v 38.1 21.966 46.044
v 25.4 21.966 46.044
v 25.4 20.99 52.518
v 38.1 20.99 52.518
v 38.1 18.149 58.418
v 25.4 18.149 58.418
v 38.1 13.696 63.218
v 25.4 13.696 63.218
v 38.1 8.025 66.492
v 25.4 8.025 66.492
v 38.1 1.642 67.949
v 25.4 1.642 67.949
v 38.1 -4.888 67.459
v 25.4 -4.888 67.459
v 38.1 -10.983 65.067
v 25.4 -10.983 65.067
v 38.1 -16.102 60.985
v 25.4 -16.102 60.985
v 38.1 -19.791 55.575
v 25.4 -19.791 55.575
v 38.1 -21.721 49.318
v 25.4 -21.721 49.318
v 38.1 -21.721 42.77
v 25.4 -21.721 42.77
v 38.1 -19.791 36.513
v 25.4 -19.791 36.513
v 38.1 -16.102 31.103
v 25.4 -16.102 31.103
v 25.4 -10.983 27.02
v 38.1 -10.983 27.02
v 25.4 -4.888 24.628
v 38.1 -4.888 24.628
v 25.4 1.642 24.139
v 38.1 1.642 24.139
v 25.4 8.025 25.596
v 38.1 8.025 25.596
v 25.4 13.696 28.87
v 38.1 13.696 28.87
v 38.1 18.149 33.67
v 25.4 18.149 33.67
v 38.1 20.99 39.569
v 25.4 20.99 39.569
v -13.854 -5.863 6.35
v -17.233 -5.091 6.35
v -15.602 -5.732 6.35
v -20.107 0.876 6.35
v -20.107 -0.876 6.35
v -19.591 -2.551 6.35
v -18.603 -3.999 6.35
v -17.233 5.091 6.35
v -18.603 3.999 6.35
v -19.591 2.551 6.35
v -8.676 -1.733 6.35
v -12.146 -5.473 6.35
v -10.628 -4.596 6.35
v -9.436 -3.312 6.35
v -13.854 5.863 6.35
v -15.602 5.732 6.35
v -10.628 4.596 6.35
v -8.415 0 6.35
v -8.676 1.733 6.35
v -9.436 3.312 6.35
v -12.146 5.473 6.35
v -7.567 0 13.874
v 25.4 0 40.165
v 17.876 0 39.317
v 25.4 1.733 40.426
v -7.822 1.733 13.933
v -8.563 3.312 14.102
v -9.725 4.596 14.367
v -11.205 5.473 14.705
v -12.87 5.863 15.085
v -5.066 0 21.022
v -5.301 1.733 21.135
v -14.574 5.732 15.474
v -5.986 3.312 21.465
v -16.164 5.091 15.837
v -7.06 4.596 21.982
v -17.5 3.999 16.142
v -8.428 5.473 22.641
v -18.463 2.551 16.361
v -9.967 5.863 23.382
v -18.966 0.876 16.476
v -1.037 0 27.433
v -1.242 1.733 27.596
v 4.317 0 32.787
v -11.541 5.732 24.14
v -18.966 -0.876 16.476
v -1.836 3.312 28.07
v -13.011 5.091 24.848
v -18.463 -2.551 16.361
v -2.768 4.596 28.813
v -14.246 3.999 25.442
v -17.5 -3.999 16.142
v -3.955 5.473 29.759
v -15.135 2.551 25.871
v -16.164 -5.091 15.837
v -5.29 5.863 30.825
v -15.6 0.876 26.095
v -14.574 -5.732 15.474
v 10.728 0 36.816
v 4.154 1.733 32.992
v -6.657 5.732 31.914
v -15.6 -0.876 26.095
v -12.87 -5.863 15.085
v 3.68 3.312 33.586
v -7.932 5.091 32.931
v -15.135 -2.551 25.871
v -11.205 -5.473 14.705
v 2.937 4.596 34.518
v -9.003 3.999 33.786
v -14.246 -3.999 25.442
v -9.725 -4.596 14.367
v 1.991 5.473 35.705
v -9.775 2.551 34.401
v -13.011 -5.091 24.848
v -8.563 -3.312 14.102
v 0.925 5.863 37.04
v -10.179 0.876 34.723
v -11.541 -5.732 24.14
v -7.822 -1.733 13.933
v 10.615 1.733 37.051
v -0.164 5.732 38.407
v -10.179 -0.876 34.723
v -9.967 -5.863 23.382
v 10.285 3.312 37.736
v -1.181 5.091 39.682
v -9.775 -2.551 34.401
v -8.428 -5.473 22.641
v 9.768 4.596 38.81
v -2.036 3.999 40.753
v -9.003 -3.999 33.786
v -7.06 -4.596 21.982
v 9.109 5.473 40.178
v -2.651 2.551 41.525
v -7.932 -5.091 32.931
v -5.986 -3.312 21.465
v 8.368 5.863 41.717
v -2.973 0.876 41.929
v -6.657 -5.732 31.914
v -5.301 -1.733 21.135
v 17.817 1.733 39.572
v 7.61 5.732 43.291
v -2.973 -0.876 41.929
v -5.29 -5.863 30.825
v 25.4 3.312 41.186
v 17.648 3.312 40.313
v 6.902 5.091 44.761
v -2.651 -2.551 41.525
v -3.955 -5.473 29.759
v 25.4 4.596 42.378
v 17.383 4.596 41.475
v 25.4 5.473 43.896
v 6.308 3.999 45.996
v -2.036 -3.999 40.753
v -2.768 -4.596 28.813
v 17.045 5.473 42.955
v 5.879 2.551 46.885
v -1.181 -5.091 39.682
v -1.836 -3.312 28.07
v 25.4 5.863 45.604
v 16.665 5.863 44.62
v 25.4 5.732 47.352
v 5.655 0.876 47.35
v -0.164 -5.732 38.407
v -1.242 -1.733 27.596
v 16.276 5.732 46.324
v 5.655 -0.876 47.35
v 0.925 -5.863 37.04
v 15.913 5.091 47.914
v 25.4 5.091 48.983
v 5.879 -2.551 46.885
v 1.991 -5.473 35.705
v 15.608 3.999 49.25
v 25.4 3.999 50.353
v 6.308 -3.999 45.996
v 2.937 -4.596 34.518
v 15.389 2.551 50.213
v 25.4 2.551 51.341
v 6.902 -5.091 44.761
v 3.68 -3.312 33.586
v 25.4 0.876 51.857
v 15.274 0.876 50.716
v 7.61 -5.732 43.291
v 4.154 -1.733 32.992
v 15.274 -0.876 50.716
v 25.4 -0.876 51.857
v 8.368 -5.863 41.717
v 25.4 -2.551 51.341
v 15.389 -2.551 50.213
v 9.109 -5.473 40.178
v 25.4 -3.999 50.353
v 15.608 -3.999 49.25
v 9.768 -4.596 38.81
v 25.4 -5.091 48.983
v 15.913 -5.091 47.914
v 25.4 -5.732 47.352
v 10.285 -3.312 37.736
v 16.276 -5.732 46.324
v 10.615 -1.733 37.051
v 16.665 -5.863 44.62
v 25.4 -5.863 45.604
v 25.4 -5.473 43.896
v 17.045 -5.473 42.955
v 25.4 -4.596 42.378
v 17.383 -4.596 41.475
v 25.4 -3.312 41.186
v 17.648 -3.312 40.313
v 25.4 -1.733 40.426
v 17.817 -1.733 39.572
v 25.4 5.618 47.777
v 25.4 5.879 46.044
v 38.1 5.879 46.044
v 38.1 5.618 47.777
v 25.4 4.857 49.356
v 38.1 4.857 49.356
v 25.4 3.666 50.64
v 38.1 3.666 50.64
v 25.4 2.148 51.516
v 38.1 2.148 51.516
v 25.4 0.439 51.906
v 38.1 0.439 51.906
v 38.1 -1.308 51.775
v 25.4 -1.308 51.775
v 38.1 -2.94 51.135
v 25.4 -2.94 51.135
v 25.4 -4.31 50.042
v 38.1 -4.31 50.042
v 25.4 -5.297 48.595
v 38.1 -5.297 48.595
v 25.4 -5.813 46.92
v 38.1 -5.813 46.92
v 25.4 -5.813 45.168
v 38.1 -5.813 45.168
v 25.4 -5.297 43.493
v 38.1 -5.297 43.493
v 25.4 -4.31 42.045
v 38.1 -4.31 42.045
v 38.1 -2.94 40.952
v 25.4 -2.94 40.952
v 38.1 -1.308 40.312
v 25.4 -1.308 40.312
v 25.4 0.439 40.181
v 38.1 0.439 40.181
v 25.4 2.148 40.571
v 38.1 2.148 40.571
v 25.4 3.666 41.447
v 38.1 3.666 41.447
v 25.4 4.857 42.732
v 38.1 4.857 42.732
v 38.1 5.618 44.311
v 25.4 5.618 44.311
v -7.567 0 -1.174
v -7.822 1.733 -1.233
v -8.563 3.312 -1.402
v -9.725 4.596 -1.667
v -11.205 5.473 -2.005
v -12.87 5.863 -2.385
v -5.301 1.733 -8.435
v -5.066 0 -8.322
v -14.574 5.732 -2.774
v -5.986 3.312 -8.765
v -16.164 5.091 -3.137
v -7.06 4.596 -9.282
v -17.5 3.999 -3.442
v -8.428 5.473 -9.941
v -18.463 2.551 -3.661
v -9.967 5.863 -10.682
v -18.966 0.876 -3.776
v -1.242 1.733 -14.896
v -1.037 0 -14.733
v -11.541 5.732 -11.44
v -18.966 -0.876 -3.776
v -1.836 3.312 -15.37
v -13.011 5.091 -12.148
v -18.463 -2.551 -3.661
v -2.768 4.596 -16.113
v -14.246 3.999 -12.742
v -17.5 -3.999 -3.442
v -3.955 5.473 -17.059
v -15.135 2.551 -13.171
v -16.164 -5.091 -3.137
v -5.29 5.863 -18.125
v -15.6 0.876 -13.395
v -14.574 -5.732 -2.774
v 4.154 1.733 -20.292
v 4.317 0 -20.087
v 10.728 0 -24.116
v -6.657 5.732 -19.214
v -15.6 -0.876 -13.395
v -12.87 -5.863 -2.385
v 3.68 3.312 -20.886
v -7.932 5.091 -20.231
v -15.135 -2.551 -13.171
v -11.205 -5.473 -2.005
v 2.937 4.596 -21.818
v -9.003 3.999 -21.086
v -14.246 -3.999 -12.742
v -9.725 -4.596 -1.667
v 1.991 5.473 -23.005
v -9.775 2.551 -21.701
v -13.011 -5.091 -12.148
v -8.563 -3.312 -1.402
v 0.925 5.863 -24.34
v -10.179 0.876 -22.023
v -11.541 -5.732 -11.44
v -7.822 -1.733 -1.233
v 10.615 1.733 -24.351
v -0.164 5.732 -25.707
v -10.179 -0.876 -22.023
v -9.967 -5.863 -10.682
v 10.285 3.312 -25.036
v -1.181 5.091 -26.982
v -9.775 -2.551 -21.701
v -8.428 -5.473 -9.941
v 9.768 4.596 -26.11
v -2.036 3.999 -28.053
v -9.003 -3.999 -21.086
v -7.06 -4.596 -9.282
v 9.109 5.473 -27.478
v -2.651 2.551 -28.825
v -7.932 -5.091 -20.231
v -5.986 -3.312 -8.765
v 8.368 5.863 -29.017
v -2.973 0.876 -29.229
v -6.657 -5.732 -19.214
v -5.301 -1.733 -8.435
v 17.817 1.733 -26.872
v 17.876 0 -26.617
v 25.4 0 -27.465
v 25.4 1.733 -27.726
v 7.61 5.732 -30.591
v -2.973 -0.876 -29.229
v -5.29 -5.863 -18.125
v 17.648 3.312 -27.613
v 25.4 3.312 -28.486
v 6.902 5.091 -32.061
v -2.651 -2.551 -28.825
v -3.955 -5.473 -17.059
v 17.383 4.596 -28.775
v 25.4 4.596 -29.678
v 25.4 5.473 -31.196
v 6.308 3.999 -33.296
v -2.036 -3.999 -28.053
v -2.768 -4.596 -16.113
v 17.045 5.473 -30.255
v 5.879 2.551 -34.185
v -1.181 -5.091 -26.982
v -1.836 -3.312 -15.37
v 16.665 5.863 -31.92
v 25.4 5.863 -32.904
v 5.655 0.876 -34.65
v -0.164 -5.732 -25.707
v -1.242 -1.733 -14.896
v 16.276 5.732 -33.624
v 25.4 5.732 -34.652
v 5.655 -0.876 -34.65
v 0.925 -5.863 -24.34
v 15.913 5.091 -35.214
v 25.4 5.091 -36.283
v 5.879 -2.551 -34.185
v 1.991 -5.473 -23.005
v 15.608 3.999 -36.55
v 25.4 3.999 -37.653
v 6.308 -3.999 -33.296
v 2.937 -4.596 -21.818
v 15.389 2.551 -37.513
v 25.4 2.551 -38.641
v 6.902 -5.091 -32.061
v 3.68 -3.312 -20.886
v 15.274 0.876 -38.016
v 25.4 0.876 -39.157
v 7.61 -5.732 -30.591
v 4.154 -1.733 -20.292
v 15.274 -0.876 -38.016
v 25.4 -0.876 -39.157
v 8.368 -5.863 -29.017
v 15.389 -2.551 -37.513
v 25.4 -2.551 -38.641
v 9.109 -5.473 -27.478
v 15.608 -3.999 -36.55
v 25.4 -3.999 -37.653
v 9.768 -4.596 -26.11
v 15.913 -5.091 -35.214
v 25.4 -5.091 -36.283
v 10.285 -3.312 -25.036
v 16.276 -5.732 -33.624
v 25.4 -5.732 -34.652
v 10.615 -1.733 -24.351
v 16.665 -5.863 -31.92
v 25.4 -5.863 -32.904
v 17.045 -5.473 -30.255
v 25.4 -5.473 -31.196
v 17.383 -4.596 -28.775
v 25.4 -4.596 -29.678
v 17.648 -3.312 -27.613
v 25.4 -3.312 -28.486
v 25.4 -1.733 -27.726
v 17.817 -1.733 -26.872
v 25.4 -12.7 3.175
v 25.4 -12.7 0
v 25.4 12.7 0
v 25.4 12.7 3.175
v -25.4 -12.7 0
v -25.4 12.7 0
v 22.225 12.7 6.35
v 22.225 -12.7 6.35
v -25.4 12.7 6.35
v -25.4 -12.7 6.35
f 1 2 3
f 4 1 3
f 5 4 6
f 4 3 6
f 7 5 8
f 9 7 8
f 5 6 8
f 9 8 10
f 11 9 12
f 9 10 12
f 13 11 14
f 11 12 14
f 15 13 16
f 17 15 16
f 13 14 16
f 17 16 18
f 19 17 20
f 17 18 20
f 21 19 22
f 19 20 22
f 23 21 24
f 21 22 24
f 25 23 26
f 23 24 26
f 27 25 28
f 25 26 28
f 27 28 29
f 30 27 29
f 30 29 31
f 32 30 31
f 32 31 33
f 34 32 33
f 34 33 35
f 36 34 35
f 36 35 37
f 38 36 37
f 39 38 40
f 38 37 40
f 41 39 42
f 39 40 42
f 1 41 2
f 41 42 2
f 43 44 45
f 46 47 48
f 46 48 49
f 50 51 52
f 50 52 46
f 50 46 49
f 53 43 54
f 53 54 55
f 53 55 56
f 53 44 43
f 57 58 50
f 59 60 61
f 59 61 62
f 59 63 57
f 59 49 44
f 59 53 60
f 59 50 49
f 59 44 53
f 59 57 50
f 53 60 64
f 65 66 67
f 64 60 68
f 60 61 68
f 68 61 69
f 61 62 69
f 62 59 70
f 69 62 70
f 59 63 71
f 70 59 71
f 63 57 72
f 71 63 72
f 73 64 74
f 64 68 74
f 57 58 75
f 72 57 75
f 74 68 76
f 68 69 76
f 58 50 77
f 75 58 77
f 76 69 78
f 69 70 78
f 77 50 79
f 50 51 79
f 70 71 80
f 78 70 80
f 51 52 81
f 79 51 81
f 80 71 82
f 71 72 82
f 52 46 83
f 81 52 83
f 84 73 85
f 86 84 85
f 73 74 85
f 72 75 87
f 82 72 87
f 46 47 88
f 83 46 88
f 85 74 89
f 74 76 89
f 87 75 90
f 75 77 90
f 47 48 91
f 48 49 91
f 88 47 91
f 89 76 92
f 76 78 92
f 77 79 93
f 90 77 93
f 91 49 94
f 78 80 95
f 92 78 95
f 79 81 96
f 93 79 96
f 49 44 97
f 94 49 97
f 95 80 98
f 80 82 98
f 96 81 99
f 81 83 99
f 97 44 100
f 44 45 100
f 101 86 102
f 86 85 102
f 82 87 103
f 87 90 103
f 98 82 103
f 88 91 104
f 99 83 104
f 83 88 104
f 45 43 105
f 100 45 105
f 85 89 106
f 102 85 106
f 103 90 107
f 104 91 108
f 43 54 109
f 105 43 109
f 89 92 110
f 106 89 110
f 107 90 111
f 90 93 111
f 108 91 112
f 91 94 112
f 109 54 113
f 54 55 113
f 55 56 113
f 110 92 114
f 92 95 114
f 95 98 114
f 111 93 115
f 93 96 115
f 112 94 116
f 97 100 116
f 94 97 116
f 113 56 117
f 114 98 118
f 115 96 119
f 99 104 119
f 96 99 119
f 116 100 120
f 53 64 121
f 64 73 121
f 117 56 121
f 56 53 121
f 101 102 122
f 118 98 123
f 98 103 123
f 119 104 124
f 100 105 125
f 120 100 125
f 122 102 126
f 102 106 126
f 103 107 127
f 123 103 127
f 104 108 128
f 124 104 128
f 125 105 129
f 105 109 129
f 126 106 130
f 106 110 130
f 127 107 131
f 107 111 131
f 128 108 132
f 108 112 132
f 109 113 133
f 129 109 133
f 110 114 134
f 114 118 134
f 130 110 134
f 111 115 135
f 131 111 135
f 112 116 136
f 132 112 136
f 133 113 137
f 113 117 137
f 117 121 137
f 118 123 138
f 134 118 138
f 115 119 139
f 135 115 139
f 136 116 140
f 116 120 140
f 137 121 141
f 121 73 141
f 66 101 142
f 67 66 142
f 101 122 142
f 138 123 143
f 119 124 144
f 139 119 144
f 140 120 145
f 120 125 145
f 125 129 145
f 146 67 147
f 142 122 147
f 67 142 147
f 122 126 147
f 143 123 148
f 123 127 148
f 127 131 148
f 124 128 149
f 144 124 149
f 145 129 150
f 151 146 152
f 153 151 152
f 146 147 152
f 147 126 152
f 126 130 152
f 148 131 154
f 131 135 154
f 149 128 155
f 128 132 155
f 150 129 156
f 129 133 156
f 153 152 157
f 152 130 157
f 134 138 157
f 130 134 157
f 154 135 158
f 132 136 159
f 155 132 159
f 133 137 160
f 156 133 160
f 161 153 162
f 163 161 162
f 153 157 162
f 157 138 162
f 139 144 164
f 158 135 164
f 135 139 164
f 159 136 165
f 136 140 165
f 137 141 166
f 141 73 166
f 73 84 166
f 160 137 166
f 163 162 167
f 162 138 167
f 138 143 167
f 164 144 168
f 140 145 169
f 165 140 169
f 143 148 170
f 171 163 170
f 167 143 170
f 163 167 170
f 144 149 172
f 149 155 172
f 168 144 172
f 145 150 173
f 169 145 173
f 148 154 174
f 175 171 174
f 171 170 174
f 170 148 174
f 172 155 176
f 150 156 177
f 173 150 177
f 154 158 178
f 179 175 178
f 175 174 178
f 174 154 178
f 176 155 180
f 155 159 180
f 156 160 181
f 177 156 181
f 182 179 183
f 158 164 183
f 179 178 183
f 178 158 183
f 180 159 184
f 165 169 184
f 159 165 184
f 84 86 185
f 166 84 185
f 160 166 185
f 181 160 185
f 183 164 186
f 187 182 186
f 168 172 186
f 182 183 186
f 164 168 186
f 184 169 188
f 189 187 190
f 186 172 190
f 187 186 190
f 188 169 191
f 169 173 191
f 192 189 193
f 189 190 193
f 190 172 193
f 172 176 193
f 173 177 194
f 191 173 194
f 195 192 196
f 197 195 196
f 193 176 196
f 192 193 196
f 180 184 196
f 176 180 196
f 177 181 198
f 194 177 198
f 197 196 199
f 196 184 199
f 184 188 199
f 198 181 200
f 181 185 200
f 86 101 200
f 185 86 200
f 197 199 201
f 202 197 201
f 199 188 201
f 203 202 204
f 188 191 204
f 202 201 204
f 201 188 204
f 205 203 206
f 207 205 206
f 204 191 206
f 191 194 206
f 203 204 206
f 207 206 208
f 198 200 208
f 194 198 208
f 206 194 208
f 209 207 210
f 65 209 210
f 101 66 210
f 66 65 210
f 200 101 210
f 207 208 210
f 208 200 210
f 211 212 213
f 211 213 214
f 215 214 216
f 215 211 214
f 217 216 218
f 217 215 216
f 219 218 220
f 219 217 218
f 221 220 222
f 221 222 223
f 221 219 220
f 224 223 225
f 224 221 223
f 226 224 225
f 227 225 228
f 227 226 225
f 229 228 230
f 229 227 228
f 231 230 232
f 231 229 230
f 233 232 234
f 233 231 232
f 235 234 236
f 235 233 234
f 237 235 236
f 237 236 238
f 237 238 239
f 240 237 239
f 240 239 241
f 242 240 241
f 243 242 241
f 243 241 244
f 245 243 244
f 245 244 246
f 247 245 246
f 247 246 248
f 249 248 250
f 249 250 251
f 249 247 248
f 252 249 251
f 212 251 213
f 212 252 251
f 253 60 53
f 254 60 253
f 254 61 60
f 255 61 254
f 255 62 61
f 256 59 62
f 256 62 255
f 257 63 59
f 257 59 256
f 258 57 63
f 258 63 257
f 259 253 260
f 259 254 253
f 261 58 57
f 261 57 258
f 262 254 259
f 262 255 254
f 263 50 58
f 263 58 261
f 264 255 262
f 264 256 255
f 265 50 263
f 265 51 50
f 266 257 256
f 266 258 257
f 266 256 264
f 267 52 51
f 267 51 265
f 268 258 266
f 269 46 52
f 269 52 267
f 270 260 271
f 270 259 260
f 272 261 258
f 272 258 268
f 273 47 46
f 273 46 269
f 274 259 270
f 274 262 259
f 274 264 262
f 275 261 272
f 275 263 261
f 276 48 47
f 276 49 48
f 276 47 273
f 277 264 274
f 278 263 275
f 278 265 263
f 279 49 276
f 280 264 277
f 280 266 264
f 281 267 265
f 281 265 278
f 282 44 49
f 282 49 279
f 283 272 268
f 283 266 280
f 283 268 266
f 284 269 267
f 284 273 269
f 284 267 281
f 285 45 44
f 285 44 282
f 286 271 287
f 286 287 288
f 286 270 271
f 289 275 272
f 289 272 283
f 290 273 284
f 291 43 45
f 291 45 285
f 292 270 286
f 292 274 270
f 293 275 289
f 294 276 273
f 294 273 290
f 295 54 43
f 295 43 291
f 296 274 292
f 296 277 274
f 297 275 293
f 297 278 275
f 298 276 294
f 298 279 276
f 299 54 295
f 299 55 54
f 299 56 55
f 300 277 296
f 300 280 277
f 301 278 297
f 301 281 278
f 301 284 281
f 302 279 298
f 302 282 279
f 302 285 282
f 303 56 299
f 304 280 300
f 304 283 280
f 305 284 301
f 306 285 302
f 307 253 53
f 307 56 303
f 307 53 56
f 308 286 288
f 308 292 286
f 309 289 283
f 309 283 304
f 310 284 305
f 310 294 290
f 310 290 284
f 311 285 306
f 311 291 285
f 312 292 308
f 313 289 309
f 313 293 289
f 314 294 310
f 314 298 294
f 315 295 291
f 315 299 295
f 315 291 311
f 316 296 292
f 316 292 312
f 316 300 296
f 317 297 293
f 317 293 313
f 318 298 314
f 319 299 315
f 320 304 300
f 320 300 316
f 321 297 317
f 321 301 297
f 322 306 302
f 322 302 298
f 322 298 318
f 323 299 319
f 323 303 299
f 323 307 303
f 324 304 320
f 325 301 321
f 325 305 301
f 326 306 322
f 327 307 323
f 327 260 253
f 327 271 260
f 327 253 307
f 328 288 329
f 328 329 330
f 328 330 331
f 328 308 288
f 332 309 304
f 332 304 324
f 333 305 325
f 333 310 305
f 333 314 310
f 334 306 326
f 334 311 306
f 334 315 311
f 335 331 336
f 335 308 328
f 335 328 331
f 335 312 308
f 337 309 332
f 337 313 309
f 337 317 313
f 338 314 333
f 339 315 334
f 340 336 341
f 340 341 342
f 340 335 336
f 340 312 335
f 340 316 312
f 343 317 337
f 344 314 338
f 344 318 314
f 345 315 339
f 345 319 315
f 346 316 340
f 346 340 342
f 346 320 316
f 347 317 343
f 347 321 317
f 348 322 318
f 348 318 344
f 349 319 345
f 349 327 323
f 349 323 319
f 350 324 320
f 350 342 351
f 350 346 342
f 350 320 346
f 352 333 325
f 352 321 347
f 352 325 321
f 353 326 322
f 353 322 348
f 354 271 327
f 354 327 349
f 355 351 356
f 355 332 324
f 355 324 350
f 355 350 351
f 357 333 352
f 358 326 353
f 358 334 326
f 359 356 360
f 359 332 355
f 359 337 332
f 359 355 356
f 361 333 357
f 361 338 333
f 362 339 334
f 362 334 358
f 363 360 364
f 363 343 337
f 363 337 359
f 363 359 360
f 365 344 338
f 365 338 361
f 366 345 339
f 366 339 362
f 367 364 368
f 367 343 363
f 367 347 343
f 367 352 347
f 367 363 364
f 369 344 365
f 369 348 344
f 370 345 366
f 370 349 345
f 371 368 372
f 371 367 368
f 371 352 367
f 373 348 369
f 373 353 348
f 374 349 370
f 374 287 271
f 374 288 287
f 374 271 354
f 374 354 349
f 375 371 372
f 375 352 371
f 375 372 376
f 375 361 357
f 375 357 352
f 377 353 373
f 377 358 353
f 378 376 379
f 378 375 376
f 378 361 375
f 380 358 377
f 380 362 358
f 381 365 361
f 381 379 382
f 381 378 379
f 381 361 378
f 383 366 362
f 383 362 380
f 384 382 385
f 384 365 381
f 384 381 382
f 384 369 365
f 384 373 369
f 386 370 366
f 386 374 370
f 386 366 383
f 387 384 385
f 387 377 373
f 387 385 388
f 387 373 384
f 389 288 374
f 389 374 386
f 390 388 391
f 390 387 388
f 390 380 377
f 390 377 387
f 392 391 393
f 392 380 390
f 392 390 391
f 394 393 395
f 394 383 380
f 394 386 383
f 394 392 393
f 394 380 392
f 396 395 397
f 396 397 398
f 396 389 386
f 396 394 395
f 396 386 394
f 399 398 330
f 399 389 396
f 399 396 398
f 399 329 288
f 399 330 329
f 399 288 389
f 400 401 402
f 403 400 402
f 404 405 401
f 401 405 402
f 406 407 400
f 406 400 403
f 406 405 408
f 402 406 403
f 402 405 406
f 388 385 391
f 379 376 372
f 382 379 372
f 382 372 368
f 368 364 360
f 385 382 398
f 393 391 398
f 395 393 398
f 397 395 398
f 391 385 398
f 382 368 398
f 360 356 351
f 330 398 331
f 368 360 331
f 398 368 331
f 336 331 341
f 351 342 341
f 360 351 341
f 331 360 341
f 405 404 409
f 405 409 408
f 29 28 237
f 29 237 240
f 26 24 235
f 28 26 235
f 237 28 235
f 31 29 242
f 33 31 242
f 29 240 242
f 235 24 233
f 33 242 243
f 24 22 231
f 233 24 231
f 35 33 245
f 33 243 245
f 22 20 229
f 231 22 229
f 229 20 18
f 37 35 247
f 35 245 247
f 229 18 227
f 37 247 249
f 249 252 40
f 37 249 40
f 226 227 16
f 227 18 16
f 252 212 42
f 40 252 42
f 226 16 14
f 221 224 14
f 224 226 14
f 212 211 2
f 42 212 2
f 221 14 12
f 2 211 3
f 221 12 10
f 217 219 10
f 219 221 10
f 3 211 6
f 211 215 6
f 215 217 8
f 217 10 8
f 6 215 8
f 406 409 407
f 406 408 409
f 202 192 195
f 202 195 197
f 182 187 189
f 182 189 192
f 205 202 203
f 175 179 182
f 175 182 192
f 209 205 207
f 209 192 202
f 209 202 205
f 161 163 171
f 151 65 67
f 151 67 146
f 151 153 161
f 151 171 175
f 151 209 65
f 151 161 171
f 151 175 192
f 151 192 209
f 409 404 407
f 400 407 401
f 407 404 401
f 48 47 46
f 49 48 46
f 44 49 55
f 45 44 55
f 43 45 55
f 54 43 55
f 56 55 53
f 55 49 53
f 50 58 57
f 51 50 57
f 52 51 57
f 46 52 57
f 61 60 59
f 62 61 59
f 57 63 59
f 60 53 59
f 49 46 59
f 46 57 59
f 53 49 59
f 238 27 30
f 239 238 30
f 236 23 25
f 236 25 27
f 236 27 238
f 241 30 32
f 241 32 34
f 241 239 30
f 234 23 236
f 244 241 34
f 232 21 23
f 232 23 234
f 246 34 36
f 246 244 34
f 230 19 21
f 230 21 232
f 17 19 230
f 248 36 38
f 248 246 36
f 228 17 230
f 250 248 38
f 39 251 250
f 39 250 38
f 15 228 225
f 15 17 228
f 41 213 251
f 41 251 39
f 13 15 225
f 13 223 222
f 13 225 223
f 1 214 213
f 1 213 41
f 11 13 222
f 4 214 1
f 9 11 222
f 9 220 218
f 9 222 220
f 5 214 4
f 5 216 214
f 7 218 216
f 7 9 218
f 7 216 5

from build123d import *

# Parameters (mm, degrees)
F0_W     = 50.8
F0_H     = 25.4
F1_DEPTH = 6.35
F2_R     = 5.8790232396
F3_ANGLE = 90
F4_R     = 21.9663082532
F4_R_2   = 5.8790232396
F5_DEPTH = 12.7
F7_SIZE  = 3.175


with BuildPart() as f1:
    # F0 (on Top) → F1 (new body)
    with BuildSketch(Plane.XY):
        Rectangle(F0_W, F0_H)
    extrude(amount=F1_DEPTH)

    # F7
    f7_edges = [f1.edges().sort_by_distance(p)[0] for p in [
        (25.4, 0, 6.35),
    ]]
    chamfer(f7_edges, length=F7_SIZE)


with BuildPart() as f3:
    # F2 (on face) → F3 (revolve)
    with BuildSketch(Plane.XY.offset(6.35)):
        with Locations((-14.2937339842, 0)):
            Circle(F2_R)
    revolve(axis=Axis((25.4, 0, 6.35), (0, 1, 0)), revolution_arc=F3_ANGLE)


with BuildPart() as f5:
    # F4 (on face) → F5 (new body)
    with BuildSketch(Plane.YZ.offset(25.4)):
        with Locations((0, 46.0437339842)):
            Circle(F4_R)
        with Locations((0, 46.0437339842)):
            Circle(F4_R_2, mode=Mode.SUBTRACT)
    extrude(amount=F5_DEPTH)


with BuildPart() as f6_1:
    # F6: instance of F3
    add(f3.part.mirror(Plane.XY.offset(6.35)))


solid = Compound([f1.part, f3.part, f5.part, f6_1.part])
